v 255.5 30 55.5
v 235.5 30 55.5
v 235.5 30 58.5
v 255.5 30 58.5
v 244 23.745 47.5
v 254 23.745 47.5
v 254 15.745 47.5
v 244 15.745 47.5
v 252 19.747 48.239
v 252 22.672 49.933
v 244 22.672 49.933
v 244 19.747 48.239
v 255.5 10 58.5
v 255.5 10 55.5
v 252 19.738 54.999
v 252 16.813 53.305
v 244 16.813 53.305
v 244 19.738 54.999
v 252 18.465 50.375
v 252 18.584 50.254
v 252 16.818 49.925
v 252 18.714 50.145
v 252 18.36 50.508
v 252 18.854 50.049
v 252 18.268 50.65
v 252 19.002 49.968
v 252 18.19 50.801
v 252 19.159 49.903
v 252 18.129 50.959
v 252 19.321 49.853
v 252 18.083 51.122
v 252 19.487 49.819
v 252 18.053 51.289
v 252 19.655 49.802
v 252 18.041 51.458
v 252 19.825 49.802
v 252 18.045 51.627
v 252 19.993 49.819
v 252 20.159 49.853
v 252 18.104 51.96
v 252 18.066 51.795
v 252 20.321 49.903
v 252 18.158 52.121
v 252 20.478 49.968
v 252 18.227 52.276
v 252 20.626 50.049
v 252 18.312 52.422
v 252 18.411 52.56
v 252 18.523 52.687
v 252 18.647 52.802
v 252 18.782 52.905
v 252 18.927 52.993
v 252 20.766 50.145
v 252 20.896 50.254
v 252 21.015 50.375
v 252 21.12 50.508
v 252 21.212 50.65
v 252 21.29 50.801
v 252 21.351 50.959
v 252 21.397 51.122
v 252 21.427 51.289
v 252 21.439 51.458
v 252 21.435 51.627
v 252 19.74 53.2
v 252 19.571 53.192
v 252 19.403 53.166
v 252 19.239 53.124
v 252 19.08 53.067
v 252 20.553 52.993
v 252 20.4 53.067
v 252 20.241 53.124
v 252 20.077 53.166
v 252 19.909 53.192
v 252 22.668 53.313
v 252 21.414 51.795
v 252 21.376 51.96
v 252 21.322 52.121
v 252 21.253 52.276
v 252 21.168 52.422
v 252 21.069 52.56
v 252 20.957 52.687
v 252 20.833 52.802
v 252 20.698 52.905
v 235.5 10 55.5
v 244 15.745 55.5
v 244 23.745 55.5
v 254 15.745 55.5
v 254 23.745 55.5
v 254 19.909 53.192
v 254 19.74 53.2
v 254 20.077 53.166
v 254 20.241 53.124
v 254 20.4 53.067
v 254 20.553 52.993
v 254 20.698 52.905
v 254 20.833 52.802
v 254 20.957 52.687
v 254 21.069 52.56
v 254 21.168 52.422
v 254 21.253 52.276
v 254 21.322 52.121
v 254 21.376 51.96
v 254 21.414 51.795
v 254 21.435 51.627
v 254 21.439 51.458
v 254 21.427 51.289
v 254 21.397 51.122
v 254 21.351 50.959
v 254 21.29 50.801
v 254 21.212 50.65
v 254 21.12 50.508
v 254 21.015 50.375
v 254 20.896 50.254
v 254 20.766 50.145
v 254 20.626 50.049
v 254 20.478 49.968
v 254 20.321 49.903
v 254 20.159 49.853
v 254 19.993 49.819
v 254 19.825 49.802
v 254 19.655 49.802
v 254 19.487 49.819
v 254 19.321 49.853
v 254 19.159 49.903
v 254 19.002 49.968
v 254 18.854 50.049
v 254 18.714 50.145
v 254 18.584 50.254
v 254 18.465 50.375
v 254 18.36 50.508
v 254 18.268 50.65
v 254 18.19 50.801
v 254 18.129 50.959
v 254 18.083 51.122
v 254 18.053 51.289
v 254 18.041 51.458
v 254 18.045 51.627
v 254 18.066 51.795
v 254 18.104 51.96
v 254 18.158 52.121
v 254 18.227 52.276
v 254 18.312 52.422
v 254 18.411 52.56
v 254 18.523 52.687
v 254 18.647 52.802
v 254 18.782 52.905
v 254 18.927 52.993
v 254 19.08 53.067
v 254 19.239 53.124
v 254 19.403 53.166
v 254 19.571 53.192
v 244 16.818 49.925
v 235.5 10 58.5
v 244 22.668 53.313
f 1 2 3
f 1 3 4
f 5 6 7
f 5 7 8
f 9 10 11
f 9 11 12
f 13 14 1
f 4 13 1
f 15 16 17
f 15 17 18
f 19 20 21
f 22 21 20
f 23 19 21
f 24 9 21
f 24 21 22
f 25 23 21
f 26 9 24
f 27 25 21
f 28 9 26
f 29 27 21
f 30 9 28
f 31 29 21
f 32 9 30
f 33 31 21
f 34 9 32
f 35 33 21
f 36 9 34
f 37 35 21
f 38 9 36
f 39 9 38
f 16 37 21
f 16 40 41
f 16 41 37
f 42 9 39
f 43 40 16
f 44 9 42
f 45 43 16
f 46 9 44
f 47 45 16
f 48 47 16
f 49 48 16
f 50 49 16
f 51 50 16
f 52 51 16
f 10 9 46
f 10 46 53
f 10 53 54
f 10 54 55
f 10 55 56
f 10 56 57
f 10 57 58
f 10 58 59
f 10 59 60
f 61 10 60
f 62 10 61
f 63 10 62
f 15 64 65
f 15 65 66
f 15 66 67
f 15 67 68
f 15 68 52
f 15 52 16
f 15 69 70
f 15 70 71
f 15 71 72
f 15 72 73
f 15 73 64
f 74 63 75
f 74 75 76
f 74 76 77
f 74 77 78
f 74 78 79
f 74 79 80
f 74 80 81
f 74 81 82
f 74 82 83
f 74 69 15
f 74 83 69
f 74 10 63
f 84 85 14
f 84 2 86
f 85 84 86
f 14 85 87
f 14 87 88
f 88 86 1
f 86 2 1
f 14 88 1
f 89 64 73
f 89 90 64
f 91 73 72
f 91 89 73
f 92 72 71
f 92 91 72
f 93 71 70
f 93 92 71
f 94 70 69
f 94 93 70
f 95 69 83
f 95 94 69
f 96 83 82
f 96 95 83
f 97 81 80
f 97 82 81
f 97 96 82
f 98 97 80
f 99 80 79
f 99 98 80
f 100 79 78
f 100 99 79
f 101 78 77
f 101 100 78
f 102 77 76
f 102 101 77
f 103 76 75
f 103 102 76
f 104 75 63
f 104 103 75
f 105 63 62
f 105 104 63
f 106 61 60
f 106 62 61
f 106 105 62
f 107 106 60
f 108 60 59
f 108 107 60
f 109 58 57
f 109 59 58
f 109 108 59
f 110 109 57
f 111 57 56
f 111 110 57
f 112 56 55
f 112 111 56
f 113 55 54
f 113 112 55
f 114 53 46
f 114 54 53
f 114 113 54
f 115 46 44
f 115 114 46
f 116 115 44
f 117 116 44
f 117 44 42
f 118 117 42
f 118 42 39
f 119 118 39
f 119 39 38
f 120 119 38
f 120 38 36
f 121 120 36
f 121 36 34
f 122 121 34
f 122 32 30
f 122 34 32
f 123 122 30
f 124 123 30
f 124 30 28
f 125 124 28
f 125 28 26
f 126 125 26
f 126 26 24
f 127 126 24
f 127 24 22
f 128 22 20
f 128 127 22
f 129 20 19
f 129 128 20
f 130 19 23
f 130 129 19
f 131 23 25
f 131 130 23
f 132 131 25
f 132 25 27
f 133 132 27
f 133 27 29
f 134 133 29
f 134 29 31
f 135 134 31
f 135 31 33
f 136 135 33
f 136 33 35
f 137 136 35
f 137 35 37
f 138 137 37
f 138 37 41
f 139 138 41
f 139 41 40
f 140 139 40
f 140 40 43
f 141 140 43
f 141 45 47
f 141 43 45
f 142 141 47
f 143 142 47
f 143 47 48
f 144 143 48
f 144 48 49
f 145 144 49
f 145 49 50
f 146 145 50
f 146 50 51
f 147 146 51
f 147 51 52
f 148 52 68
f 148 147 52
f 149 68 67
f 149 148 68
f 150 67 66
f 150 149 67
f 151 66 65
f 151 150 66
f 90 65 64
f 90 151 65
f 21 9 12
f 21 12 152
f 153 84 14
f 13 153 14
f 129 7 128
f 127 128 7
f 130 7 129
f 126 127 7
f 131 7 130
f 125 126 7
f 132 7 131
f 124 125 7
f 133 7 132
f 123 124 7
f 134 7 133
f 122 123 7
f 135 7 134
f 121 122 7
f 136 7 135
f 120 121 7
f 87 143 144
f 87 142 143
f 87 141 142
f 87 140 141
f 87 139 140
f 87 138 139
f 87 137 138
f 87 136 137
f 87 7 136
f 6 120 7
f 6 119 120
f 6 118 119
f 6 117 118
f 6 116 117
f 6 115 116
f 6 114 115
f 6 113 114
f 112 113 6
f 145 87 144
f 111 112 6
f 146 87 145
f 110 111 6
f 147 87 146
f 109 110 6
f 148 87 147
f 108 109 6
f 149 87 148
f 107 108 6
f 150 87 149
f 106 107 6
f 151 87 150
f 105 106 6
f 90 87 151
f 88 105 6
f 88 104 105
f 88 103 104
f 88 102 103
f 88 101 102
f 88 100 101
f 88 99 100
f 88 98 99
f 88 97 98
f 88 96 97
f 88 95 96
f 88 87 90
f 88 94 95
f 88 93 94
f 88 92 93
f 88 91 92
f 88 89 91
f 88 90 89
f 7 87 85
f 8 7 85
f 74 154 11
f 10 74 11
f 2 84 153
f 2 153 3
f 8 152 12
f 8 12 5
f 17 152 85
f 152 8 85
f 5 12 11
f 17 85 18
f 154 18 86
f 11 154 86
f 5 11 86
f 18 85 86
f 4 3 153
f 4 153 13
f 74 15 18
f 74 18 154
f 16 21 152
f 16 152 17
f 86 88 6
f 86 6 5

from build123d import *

# Parameters (mm, degrees)
CYLINDER032_R              = 1.7
CYLINDER032_DEPTH          = 20
EXTRUDE005_DEPTH           = 9
EXTRUDE005_PLACEMENT_ANGLE = 90
BOX044_W                   = 10
BOX044_H                   = 8
BOX044_DEPTH               = 8
CUT053_PLACEMENT_ANGLE     = 180
BOX043_W                   = 20
BOX043_H                   = 20
BOX043_DEPTH               = 3


with BuildPart() as cylinder032:
    # Cylinder032 → Cylinder032 (new body)
    with BuildSketch(Plane(origin=(140, 9.74, 51.5), x_dir=(0, 0, -1), z_dir=(1, 0, 0))):
        Circle(CYLINDER032_R)
    extrude(amount=CYLINDER032_DEPTH)


with BuildPart() as extrude005:
    # Sketch005 → Extrude005 (new body)
    with BuildSketch(Plane.XY.offset(75)):
        Polygon((-29.694611, 6.813304), (-28.00073, 9.738351), (-29.686954, 12.667818), (-33.06706, 12.672239), (-34.760941, 9.747192), (-33.074716, 6.817725), align=None)
    extrude(amount=EXTRUDE005_DEPTH)


with BuildPart() as extrude005_1:
    # Extrude005 placement: moved
    add(extrude005.part.moved(Location((71, 0, 0))).rotate(Axis((71, 0, 0), (0, 1, 0)), EXTRUDE005_PLACEMENT_ANGLE))


with BuildPart() as cut053:
    # Box044 → Box044 (new body)
    with BuildSketch(Plane(origin=(144, 5.745, 27.5), x_dir=(1, 0, 0), z_dir=(0, 0, 1))):
        with Locations((5, 4)):
            Rectangle(BOX044_W, BOX044_H)
    extrude(amount=BOX044_DEPTH)

    # Cut052: cut Extrude005
    add(extrude005_1.part, mode=Mode.SUBTRACT)


with BuildPart() as cut053_1:
    # Cut052 placement: moved
    add(cut053.part.moved(Location((0, 0, 20))))

    # Cut053: cut Cylinder032
    add(cylinder032.part, mode=Mode.SUBTRACT)


with BuildPart() as cut053_2:
    # Cut053 placement: moved
    add(cut053_1.part.moved(Location((398, 10, 103))).rotate(Axis((398, 10, 103), (0, 1, 0)), CUT053_PLACEMENT_ANGLE))


with BuildPart() as topmounttest:
    # Box043 → Box043 (new body)
    with BuildSketch(Plane(origin=(235.5, 10, 55.5), x_dir=(1, 0, 0), z_dir=(0, 0, 1))):
        with Locations((10, 10)):
            Rectangle(BOX043_W, BOX043_H)
    extrude(amount=BOX043_DEPTH)

    # Fusion002: union Cut053
    add(cut053_2.part)


solid = topmounttest.part
